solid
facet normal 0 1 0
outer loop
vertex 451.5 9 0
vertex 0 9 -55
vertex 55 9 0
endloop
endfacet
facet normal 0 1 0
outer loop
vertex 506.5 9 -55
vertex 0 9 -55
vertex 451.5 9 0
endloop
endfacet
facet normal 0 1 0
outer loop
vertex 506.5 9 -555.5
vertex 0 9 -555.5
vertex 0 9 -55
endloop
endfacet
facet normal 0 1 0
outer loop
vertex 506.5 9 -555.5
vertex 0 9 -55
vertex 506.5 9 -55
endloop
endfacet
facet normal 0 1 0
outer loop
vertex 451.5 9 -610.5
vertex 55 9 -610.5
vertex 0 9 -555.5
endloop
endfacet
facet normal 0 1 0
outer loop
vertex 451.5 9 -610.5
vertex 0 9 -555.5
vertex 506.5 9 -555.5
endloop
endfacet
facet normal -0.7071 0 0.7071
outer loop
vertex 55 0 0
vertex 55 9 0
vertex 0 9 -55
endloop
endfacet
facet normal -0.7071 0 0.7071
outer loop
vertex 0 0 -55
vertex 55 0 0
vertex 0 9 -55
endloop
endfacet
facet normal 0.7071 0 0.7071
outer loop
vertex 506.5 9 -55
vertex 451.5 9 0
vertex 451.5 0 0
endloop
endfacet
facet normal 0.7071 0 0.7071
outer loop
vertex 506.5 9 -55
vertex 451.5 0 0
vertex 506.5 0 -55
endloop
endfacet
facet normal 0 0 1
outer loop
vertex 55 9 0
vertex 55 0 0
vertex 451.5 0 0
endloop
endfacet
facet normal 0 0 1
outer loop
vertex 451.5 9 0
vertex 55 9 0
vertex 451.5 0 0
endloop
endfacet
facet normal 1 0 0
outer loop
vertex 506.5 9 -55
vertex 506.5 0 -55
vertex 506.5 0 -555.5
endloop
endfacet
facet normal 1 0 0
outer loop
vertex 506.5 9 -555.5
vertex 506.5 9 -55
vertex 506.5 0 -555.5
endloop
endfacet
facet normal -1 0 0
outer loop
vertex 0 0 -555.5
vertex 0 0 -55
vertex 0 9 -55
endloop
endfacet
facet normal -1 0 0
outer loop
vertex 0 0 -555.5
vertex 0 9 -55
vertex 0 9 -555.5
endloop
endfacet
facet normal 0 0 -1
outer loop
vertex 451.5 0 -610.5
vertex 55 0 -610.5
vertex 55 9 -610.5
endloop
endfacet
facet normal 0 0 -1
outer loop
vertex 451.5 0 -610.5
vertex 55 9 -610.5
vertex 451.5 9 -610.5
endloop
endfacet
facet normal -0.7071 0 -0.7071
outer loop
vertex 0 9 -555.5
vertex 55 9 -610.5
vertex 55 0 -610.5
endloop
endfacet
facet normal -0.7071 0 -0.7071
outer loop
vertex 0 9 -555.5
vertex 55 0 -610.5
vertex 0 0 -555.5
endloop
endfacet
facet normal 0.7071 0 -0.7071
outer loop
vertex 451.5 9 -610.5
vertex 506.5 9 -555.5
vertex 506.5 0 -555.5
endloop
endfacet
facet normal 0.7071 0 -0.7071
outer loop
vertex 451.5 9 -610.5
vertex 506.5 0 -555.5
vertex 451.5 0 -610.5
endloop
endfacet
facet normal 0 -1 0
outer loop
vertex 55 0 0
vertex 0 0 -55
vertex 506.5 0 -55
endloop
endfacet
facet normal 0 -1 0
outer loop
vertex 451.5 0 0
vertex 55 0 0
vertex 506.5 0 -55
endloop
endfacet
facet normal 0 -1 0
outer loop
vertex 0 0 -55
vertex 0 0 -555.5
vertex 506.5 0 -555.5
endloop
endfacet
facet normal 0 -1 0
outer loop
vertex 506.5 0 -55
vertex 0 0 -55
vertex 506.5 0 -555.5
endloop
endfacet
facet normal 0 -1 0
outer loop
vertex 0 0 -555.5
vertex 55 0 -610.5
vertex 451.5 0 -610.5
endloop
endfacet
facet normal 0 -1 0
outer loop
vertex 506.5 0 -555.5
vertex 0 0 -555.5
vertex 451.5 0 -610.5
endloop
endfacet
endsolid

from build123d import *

# Parameters (mm, degrees)
SKETCH1_W           = 506.5
SKETCH1_H           = 610.5
BOSS_EXTRUDE1_DEPTH = 9
CUT_EXTRUDE1_DEPTH  = 10


with BuildPart() as part:
    # Sketch1 → Boss-Extrude1 (new body)
    with BuildSketch(Plane(origin=(0, 0, 0), x_dir=(1, 0, 0), z_dir=(0, 1, 0))):
        with Locations((253.25, 305.25)):
            Rectangle(SKETCH1_W, SKETCH1_H)
    extrude(amount=BOSS_EXTRUDE1_DEPTH)

    # Sketch2 → Cut-Extrude1 (cut, through all)
    with BuildSketch(Plane(origin=(0, 9, 0), x_dir=(1, 0, 0), z_dir=(0, 1, 0))):
        Polygon((0, 0), (55, 0), (0, 55), align=None)
        Polygon((506.5, 0), (451.5, 0), (506.5, 55), align=None)
        Polygon((506.5, 610.5), (506.5, 555.5), (451.5, 610.5), align=None)
        Polygon((0, 610.5), (55, 610.5), (0, 555.5), align=None)
    extrude(amount=-CUT_EXTRUDE1_DEPTH, mode=Mode.SUBTRACT)


solid = part.part
